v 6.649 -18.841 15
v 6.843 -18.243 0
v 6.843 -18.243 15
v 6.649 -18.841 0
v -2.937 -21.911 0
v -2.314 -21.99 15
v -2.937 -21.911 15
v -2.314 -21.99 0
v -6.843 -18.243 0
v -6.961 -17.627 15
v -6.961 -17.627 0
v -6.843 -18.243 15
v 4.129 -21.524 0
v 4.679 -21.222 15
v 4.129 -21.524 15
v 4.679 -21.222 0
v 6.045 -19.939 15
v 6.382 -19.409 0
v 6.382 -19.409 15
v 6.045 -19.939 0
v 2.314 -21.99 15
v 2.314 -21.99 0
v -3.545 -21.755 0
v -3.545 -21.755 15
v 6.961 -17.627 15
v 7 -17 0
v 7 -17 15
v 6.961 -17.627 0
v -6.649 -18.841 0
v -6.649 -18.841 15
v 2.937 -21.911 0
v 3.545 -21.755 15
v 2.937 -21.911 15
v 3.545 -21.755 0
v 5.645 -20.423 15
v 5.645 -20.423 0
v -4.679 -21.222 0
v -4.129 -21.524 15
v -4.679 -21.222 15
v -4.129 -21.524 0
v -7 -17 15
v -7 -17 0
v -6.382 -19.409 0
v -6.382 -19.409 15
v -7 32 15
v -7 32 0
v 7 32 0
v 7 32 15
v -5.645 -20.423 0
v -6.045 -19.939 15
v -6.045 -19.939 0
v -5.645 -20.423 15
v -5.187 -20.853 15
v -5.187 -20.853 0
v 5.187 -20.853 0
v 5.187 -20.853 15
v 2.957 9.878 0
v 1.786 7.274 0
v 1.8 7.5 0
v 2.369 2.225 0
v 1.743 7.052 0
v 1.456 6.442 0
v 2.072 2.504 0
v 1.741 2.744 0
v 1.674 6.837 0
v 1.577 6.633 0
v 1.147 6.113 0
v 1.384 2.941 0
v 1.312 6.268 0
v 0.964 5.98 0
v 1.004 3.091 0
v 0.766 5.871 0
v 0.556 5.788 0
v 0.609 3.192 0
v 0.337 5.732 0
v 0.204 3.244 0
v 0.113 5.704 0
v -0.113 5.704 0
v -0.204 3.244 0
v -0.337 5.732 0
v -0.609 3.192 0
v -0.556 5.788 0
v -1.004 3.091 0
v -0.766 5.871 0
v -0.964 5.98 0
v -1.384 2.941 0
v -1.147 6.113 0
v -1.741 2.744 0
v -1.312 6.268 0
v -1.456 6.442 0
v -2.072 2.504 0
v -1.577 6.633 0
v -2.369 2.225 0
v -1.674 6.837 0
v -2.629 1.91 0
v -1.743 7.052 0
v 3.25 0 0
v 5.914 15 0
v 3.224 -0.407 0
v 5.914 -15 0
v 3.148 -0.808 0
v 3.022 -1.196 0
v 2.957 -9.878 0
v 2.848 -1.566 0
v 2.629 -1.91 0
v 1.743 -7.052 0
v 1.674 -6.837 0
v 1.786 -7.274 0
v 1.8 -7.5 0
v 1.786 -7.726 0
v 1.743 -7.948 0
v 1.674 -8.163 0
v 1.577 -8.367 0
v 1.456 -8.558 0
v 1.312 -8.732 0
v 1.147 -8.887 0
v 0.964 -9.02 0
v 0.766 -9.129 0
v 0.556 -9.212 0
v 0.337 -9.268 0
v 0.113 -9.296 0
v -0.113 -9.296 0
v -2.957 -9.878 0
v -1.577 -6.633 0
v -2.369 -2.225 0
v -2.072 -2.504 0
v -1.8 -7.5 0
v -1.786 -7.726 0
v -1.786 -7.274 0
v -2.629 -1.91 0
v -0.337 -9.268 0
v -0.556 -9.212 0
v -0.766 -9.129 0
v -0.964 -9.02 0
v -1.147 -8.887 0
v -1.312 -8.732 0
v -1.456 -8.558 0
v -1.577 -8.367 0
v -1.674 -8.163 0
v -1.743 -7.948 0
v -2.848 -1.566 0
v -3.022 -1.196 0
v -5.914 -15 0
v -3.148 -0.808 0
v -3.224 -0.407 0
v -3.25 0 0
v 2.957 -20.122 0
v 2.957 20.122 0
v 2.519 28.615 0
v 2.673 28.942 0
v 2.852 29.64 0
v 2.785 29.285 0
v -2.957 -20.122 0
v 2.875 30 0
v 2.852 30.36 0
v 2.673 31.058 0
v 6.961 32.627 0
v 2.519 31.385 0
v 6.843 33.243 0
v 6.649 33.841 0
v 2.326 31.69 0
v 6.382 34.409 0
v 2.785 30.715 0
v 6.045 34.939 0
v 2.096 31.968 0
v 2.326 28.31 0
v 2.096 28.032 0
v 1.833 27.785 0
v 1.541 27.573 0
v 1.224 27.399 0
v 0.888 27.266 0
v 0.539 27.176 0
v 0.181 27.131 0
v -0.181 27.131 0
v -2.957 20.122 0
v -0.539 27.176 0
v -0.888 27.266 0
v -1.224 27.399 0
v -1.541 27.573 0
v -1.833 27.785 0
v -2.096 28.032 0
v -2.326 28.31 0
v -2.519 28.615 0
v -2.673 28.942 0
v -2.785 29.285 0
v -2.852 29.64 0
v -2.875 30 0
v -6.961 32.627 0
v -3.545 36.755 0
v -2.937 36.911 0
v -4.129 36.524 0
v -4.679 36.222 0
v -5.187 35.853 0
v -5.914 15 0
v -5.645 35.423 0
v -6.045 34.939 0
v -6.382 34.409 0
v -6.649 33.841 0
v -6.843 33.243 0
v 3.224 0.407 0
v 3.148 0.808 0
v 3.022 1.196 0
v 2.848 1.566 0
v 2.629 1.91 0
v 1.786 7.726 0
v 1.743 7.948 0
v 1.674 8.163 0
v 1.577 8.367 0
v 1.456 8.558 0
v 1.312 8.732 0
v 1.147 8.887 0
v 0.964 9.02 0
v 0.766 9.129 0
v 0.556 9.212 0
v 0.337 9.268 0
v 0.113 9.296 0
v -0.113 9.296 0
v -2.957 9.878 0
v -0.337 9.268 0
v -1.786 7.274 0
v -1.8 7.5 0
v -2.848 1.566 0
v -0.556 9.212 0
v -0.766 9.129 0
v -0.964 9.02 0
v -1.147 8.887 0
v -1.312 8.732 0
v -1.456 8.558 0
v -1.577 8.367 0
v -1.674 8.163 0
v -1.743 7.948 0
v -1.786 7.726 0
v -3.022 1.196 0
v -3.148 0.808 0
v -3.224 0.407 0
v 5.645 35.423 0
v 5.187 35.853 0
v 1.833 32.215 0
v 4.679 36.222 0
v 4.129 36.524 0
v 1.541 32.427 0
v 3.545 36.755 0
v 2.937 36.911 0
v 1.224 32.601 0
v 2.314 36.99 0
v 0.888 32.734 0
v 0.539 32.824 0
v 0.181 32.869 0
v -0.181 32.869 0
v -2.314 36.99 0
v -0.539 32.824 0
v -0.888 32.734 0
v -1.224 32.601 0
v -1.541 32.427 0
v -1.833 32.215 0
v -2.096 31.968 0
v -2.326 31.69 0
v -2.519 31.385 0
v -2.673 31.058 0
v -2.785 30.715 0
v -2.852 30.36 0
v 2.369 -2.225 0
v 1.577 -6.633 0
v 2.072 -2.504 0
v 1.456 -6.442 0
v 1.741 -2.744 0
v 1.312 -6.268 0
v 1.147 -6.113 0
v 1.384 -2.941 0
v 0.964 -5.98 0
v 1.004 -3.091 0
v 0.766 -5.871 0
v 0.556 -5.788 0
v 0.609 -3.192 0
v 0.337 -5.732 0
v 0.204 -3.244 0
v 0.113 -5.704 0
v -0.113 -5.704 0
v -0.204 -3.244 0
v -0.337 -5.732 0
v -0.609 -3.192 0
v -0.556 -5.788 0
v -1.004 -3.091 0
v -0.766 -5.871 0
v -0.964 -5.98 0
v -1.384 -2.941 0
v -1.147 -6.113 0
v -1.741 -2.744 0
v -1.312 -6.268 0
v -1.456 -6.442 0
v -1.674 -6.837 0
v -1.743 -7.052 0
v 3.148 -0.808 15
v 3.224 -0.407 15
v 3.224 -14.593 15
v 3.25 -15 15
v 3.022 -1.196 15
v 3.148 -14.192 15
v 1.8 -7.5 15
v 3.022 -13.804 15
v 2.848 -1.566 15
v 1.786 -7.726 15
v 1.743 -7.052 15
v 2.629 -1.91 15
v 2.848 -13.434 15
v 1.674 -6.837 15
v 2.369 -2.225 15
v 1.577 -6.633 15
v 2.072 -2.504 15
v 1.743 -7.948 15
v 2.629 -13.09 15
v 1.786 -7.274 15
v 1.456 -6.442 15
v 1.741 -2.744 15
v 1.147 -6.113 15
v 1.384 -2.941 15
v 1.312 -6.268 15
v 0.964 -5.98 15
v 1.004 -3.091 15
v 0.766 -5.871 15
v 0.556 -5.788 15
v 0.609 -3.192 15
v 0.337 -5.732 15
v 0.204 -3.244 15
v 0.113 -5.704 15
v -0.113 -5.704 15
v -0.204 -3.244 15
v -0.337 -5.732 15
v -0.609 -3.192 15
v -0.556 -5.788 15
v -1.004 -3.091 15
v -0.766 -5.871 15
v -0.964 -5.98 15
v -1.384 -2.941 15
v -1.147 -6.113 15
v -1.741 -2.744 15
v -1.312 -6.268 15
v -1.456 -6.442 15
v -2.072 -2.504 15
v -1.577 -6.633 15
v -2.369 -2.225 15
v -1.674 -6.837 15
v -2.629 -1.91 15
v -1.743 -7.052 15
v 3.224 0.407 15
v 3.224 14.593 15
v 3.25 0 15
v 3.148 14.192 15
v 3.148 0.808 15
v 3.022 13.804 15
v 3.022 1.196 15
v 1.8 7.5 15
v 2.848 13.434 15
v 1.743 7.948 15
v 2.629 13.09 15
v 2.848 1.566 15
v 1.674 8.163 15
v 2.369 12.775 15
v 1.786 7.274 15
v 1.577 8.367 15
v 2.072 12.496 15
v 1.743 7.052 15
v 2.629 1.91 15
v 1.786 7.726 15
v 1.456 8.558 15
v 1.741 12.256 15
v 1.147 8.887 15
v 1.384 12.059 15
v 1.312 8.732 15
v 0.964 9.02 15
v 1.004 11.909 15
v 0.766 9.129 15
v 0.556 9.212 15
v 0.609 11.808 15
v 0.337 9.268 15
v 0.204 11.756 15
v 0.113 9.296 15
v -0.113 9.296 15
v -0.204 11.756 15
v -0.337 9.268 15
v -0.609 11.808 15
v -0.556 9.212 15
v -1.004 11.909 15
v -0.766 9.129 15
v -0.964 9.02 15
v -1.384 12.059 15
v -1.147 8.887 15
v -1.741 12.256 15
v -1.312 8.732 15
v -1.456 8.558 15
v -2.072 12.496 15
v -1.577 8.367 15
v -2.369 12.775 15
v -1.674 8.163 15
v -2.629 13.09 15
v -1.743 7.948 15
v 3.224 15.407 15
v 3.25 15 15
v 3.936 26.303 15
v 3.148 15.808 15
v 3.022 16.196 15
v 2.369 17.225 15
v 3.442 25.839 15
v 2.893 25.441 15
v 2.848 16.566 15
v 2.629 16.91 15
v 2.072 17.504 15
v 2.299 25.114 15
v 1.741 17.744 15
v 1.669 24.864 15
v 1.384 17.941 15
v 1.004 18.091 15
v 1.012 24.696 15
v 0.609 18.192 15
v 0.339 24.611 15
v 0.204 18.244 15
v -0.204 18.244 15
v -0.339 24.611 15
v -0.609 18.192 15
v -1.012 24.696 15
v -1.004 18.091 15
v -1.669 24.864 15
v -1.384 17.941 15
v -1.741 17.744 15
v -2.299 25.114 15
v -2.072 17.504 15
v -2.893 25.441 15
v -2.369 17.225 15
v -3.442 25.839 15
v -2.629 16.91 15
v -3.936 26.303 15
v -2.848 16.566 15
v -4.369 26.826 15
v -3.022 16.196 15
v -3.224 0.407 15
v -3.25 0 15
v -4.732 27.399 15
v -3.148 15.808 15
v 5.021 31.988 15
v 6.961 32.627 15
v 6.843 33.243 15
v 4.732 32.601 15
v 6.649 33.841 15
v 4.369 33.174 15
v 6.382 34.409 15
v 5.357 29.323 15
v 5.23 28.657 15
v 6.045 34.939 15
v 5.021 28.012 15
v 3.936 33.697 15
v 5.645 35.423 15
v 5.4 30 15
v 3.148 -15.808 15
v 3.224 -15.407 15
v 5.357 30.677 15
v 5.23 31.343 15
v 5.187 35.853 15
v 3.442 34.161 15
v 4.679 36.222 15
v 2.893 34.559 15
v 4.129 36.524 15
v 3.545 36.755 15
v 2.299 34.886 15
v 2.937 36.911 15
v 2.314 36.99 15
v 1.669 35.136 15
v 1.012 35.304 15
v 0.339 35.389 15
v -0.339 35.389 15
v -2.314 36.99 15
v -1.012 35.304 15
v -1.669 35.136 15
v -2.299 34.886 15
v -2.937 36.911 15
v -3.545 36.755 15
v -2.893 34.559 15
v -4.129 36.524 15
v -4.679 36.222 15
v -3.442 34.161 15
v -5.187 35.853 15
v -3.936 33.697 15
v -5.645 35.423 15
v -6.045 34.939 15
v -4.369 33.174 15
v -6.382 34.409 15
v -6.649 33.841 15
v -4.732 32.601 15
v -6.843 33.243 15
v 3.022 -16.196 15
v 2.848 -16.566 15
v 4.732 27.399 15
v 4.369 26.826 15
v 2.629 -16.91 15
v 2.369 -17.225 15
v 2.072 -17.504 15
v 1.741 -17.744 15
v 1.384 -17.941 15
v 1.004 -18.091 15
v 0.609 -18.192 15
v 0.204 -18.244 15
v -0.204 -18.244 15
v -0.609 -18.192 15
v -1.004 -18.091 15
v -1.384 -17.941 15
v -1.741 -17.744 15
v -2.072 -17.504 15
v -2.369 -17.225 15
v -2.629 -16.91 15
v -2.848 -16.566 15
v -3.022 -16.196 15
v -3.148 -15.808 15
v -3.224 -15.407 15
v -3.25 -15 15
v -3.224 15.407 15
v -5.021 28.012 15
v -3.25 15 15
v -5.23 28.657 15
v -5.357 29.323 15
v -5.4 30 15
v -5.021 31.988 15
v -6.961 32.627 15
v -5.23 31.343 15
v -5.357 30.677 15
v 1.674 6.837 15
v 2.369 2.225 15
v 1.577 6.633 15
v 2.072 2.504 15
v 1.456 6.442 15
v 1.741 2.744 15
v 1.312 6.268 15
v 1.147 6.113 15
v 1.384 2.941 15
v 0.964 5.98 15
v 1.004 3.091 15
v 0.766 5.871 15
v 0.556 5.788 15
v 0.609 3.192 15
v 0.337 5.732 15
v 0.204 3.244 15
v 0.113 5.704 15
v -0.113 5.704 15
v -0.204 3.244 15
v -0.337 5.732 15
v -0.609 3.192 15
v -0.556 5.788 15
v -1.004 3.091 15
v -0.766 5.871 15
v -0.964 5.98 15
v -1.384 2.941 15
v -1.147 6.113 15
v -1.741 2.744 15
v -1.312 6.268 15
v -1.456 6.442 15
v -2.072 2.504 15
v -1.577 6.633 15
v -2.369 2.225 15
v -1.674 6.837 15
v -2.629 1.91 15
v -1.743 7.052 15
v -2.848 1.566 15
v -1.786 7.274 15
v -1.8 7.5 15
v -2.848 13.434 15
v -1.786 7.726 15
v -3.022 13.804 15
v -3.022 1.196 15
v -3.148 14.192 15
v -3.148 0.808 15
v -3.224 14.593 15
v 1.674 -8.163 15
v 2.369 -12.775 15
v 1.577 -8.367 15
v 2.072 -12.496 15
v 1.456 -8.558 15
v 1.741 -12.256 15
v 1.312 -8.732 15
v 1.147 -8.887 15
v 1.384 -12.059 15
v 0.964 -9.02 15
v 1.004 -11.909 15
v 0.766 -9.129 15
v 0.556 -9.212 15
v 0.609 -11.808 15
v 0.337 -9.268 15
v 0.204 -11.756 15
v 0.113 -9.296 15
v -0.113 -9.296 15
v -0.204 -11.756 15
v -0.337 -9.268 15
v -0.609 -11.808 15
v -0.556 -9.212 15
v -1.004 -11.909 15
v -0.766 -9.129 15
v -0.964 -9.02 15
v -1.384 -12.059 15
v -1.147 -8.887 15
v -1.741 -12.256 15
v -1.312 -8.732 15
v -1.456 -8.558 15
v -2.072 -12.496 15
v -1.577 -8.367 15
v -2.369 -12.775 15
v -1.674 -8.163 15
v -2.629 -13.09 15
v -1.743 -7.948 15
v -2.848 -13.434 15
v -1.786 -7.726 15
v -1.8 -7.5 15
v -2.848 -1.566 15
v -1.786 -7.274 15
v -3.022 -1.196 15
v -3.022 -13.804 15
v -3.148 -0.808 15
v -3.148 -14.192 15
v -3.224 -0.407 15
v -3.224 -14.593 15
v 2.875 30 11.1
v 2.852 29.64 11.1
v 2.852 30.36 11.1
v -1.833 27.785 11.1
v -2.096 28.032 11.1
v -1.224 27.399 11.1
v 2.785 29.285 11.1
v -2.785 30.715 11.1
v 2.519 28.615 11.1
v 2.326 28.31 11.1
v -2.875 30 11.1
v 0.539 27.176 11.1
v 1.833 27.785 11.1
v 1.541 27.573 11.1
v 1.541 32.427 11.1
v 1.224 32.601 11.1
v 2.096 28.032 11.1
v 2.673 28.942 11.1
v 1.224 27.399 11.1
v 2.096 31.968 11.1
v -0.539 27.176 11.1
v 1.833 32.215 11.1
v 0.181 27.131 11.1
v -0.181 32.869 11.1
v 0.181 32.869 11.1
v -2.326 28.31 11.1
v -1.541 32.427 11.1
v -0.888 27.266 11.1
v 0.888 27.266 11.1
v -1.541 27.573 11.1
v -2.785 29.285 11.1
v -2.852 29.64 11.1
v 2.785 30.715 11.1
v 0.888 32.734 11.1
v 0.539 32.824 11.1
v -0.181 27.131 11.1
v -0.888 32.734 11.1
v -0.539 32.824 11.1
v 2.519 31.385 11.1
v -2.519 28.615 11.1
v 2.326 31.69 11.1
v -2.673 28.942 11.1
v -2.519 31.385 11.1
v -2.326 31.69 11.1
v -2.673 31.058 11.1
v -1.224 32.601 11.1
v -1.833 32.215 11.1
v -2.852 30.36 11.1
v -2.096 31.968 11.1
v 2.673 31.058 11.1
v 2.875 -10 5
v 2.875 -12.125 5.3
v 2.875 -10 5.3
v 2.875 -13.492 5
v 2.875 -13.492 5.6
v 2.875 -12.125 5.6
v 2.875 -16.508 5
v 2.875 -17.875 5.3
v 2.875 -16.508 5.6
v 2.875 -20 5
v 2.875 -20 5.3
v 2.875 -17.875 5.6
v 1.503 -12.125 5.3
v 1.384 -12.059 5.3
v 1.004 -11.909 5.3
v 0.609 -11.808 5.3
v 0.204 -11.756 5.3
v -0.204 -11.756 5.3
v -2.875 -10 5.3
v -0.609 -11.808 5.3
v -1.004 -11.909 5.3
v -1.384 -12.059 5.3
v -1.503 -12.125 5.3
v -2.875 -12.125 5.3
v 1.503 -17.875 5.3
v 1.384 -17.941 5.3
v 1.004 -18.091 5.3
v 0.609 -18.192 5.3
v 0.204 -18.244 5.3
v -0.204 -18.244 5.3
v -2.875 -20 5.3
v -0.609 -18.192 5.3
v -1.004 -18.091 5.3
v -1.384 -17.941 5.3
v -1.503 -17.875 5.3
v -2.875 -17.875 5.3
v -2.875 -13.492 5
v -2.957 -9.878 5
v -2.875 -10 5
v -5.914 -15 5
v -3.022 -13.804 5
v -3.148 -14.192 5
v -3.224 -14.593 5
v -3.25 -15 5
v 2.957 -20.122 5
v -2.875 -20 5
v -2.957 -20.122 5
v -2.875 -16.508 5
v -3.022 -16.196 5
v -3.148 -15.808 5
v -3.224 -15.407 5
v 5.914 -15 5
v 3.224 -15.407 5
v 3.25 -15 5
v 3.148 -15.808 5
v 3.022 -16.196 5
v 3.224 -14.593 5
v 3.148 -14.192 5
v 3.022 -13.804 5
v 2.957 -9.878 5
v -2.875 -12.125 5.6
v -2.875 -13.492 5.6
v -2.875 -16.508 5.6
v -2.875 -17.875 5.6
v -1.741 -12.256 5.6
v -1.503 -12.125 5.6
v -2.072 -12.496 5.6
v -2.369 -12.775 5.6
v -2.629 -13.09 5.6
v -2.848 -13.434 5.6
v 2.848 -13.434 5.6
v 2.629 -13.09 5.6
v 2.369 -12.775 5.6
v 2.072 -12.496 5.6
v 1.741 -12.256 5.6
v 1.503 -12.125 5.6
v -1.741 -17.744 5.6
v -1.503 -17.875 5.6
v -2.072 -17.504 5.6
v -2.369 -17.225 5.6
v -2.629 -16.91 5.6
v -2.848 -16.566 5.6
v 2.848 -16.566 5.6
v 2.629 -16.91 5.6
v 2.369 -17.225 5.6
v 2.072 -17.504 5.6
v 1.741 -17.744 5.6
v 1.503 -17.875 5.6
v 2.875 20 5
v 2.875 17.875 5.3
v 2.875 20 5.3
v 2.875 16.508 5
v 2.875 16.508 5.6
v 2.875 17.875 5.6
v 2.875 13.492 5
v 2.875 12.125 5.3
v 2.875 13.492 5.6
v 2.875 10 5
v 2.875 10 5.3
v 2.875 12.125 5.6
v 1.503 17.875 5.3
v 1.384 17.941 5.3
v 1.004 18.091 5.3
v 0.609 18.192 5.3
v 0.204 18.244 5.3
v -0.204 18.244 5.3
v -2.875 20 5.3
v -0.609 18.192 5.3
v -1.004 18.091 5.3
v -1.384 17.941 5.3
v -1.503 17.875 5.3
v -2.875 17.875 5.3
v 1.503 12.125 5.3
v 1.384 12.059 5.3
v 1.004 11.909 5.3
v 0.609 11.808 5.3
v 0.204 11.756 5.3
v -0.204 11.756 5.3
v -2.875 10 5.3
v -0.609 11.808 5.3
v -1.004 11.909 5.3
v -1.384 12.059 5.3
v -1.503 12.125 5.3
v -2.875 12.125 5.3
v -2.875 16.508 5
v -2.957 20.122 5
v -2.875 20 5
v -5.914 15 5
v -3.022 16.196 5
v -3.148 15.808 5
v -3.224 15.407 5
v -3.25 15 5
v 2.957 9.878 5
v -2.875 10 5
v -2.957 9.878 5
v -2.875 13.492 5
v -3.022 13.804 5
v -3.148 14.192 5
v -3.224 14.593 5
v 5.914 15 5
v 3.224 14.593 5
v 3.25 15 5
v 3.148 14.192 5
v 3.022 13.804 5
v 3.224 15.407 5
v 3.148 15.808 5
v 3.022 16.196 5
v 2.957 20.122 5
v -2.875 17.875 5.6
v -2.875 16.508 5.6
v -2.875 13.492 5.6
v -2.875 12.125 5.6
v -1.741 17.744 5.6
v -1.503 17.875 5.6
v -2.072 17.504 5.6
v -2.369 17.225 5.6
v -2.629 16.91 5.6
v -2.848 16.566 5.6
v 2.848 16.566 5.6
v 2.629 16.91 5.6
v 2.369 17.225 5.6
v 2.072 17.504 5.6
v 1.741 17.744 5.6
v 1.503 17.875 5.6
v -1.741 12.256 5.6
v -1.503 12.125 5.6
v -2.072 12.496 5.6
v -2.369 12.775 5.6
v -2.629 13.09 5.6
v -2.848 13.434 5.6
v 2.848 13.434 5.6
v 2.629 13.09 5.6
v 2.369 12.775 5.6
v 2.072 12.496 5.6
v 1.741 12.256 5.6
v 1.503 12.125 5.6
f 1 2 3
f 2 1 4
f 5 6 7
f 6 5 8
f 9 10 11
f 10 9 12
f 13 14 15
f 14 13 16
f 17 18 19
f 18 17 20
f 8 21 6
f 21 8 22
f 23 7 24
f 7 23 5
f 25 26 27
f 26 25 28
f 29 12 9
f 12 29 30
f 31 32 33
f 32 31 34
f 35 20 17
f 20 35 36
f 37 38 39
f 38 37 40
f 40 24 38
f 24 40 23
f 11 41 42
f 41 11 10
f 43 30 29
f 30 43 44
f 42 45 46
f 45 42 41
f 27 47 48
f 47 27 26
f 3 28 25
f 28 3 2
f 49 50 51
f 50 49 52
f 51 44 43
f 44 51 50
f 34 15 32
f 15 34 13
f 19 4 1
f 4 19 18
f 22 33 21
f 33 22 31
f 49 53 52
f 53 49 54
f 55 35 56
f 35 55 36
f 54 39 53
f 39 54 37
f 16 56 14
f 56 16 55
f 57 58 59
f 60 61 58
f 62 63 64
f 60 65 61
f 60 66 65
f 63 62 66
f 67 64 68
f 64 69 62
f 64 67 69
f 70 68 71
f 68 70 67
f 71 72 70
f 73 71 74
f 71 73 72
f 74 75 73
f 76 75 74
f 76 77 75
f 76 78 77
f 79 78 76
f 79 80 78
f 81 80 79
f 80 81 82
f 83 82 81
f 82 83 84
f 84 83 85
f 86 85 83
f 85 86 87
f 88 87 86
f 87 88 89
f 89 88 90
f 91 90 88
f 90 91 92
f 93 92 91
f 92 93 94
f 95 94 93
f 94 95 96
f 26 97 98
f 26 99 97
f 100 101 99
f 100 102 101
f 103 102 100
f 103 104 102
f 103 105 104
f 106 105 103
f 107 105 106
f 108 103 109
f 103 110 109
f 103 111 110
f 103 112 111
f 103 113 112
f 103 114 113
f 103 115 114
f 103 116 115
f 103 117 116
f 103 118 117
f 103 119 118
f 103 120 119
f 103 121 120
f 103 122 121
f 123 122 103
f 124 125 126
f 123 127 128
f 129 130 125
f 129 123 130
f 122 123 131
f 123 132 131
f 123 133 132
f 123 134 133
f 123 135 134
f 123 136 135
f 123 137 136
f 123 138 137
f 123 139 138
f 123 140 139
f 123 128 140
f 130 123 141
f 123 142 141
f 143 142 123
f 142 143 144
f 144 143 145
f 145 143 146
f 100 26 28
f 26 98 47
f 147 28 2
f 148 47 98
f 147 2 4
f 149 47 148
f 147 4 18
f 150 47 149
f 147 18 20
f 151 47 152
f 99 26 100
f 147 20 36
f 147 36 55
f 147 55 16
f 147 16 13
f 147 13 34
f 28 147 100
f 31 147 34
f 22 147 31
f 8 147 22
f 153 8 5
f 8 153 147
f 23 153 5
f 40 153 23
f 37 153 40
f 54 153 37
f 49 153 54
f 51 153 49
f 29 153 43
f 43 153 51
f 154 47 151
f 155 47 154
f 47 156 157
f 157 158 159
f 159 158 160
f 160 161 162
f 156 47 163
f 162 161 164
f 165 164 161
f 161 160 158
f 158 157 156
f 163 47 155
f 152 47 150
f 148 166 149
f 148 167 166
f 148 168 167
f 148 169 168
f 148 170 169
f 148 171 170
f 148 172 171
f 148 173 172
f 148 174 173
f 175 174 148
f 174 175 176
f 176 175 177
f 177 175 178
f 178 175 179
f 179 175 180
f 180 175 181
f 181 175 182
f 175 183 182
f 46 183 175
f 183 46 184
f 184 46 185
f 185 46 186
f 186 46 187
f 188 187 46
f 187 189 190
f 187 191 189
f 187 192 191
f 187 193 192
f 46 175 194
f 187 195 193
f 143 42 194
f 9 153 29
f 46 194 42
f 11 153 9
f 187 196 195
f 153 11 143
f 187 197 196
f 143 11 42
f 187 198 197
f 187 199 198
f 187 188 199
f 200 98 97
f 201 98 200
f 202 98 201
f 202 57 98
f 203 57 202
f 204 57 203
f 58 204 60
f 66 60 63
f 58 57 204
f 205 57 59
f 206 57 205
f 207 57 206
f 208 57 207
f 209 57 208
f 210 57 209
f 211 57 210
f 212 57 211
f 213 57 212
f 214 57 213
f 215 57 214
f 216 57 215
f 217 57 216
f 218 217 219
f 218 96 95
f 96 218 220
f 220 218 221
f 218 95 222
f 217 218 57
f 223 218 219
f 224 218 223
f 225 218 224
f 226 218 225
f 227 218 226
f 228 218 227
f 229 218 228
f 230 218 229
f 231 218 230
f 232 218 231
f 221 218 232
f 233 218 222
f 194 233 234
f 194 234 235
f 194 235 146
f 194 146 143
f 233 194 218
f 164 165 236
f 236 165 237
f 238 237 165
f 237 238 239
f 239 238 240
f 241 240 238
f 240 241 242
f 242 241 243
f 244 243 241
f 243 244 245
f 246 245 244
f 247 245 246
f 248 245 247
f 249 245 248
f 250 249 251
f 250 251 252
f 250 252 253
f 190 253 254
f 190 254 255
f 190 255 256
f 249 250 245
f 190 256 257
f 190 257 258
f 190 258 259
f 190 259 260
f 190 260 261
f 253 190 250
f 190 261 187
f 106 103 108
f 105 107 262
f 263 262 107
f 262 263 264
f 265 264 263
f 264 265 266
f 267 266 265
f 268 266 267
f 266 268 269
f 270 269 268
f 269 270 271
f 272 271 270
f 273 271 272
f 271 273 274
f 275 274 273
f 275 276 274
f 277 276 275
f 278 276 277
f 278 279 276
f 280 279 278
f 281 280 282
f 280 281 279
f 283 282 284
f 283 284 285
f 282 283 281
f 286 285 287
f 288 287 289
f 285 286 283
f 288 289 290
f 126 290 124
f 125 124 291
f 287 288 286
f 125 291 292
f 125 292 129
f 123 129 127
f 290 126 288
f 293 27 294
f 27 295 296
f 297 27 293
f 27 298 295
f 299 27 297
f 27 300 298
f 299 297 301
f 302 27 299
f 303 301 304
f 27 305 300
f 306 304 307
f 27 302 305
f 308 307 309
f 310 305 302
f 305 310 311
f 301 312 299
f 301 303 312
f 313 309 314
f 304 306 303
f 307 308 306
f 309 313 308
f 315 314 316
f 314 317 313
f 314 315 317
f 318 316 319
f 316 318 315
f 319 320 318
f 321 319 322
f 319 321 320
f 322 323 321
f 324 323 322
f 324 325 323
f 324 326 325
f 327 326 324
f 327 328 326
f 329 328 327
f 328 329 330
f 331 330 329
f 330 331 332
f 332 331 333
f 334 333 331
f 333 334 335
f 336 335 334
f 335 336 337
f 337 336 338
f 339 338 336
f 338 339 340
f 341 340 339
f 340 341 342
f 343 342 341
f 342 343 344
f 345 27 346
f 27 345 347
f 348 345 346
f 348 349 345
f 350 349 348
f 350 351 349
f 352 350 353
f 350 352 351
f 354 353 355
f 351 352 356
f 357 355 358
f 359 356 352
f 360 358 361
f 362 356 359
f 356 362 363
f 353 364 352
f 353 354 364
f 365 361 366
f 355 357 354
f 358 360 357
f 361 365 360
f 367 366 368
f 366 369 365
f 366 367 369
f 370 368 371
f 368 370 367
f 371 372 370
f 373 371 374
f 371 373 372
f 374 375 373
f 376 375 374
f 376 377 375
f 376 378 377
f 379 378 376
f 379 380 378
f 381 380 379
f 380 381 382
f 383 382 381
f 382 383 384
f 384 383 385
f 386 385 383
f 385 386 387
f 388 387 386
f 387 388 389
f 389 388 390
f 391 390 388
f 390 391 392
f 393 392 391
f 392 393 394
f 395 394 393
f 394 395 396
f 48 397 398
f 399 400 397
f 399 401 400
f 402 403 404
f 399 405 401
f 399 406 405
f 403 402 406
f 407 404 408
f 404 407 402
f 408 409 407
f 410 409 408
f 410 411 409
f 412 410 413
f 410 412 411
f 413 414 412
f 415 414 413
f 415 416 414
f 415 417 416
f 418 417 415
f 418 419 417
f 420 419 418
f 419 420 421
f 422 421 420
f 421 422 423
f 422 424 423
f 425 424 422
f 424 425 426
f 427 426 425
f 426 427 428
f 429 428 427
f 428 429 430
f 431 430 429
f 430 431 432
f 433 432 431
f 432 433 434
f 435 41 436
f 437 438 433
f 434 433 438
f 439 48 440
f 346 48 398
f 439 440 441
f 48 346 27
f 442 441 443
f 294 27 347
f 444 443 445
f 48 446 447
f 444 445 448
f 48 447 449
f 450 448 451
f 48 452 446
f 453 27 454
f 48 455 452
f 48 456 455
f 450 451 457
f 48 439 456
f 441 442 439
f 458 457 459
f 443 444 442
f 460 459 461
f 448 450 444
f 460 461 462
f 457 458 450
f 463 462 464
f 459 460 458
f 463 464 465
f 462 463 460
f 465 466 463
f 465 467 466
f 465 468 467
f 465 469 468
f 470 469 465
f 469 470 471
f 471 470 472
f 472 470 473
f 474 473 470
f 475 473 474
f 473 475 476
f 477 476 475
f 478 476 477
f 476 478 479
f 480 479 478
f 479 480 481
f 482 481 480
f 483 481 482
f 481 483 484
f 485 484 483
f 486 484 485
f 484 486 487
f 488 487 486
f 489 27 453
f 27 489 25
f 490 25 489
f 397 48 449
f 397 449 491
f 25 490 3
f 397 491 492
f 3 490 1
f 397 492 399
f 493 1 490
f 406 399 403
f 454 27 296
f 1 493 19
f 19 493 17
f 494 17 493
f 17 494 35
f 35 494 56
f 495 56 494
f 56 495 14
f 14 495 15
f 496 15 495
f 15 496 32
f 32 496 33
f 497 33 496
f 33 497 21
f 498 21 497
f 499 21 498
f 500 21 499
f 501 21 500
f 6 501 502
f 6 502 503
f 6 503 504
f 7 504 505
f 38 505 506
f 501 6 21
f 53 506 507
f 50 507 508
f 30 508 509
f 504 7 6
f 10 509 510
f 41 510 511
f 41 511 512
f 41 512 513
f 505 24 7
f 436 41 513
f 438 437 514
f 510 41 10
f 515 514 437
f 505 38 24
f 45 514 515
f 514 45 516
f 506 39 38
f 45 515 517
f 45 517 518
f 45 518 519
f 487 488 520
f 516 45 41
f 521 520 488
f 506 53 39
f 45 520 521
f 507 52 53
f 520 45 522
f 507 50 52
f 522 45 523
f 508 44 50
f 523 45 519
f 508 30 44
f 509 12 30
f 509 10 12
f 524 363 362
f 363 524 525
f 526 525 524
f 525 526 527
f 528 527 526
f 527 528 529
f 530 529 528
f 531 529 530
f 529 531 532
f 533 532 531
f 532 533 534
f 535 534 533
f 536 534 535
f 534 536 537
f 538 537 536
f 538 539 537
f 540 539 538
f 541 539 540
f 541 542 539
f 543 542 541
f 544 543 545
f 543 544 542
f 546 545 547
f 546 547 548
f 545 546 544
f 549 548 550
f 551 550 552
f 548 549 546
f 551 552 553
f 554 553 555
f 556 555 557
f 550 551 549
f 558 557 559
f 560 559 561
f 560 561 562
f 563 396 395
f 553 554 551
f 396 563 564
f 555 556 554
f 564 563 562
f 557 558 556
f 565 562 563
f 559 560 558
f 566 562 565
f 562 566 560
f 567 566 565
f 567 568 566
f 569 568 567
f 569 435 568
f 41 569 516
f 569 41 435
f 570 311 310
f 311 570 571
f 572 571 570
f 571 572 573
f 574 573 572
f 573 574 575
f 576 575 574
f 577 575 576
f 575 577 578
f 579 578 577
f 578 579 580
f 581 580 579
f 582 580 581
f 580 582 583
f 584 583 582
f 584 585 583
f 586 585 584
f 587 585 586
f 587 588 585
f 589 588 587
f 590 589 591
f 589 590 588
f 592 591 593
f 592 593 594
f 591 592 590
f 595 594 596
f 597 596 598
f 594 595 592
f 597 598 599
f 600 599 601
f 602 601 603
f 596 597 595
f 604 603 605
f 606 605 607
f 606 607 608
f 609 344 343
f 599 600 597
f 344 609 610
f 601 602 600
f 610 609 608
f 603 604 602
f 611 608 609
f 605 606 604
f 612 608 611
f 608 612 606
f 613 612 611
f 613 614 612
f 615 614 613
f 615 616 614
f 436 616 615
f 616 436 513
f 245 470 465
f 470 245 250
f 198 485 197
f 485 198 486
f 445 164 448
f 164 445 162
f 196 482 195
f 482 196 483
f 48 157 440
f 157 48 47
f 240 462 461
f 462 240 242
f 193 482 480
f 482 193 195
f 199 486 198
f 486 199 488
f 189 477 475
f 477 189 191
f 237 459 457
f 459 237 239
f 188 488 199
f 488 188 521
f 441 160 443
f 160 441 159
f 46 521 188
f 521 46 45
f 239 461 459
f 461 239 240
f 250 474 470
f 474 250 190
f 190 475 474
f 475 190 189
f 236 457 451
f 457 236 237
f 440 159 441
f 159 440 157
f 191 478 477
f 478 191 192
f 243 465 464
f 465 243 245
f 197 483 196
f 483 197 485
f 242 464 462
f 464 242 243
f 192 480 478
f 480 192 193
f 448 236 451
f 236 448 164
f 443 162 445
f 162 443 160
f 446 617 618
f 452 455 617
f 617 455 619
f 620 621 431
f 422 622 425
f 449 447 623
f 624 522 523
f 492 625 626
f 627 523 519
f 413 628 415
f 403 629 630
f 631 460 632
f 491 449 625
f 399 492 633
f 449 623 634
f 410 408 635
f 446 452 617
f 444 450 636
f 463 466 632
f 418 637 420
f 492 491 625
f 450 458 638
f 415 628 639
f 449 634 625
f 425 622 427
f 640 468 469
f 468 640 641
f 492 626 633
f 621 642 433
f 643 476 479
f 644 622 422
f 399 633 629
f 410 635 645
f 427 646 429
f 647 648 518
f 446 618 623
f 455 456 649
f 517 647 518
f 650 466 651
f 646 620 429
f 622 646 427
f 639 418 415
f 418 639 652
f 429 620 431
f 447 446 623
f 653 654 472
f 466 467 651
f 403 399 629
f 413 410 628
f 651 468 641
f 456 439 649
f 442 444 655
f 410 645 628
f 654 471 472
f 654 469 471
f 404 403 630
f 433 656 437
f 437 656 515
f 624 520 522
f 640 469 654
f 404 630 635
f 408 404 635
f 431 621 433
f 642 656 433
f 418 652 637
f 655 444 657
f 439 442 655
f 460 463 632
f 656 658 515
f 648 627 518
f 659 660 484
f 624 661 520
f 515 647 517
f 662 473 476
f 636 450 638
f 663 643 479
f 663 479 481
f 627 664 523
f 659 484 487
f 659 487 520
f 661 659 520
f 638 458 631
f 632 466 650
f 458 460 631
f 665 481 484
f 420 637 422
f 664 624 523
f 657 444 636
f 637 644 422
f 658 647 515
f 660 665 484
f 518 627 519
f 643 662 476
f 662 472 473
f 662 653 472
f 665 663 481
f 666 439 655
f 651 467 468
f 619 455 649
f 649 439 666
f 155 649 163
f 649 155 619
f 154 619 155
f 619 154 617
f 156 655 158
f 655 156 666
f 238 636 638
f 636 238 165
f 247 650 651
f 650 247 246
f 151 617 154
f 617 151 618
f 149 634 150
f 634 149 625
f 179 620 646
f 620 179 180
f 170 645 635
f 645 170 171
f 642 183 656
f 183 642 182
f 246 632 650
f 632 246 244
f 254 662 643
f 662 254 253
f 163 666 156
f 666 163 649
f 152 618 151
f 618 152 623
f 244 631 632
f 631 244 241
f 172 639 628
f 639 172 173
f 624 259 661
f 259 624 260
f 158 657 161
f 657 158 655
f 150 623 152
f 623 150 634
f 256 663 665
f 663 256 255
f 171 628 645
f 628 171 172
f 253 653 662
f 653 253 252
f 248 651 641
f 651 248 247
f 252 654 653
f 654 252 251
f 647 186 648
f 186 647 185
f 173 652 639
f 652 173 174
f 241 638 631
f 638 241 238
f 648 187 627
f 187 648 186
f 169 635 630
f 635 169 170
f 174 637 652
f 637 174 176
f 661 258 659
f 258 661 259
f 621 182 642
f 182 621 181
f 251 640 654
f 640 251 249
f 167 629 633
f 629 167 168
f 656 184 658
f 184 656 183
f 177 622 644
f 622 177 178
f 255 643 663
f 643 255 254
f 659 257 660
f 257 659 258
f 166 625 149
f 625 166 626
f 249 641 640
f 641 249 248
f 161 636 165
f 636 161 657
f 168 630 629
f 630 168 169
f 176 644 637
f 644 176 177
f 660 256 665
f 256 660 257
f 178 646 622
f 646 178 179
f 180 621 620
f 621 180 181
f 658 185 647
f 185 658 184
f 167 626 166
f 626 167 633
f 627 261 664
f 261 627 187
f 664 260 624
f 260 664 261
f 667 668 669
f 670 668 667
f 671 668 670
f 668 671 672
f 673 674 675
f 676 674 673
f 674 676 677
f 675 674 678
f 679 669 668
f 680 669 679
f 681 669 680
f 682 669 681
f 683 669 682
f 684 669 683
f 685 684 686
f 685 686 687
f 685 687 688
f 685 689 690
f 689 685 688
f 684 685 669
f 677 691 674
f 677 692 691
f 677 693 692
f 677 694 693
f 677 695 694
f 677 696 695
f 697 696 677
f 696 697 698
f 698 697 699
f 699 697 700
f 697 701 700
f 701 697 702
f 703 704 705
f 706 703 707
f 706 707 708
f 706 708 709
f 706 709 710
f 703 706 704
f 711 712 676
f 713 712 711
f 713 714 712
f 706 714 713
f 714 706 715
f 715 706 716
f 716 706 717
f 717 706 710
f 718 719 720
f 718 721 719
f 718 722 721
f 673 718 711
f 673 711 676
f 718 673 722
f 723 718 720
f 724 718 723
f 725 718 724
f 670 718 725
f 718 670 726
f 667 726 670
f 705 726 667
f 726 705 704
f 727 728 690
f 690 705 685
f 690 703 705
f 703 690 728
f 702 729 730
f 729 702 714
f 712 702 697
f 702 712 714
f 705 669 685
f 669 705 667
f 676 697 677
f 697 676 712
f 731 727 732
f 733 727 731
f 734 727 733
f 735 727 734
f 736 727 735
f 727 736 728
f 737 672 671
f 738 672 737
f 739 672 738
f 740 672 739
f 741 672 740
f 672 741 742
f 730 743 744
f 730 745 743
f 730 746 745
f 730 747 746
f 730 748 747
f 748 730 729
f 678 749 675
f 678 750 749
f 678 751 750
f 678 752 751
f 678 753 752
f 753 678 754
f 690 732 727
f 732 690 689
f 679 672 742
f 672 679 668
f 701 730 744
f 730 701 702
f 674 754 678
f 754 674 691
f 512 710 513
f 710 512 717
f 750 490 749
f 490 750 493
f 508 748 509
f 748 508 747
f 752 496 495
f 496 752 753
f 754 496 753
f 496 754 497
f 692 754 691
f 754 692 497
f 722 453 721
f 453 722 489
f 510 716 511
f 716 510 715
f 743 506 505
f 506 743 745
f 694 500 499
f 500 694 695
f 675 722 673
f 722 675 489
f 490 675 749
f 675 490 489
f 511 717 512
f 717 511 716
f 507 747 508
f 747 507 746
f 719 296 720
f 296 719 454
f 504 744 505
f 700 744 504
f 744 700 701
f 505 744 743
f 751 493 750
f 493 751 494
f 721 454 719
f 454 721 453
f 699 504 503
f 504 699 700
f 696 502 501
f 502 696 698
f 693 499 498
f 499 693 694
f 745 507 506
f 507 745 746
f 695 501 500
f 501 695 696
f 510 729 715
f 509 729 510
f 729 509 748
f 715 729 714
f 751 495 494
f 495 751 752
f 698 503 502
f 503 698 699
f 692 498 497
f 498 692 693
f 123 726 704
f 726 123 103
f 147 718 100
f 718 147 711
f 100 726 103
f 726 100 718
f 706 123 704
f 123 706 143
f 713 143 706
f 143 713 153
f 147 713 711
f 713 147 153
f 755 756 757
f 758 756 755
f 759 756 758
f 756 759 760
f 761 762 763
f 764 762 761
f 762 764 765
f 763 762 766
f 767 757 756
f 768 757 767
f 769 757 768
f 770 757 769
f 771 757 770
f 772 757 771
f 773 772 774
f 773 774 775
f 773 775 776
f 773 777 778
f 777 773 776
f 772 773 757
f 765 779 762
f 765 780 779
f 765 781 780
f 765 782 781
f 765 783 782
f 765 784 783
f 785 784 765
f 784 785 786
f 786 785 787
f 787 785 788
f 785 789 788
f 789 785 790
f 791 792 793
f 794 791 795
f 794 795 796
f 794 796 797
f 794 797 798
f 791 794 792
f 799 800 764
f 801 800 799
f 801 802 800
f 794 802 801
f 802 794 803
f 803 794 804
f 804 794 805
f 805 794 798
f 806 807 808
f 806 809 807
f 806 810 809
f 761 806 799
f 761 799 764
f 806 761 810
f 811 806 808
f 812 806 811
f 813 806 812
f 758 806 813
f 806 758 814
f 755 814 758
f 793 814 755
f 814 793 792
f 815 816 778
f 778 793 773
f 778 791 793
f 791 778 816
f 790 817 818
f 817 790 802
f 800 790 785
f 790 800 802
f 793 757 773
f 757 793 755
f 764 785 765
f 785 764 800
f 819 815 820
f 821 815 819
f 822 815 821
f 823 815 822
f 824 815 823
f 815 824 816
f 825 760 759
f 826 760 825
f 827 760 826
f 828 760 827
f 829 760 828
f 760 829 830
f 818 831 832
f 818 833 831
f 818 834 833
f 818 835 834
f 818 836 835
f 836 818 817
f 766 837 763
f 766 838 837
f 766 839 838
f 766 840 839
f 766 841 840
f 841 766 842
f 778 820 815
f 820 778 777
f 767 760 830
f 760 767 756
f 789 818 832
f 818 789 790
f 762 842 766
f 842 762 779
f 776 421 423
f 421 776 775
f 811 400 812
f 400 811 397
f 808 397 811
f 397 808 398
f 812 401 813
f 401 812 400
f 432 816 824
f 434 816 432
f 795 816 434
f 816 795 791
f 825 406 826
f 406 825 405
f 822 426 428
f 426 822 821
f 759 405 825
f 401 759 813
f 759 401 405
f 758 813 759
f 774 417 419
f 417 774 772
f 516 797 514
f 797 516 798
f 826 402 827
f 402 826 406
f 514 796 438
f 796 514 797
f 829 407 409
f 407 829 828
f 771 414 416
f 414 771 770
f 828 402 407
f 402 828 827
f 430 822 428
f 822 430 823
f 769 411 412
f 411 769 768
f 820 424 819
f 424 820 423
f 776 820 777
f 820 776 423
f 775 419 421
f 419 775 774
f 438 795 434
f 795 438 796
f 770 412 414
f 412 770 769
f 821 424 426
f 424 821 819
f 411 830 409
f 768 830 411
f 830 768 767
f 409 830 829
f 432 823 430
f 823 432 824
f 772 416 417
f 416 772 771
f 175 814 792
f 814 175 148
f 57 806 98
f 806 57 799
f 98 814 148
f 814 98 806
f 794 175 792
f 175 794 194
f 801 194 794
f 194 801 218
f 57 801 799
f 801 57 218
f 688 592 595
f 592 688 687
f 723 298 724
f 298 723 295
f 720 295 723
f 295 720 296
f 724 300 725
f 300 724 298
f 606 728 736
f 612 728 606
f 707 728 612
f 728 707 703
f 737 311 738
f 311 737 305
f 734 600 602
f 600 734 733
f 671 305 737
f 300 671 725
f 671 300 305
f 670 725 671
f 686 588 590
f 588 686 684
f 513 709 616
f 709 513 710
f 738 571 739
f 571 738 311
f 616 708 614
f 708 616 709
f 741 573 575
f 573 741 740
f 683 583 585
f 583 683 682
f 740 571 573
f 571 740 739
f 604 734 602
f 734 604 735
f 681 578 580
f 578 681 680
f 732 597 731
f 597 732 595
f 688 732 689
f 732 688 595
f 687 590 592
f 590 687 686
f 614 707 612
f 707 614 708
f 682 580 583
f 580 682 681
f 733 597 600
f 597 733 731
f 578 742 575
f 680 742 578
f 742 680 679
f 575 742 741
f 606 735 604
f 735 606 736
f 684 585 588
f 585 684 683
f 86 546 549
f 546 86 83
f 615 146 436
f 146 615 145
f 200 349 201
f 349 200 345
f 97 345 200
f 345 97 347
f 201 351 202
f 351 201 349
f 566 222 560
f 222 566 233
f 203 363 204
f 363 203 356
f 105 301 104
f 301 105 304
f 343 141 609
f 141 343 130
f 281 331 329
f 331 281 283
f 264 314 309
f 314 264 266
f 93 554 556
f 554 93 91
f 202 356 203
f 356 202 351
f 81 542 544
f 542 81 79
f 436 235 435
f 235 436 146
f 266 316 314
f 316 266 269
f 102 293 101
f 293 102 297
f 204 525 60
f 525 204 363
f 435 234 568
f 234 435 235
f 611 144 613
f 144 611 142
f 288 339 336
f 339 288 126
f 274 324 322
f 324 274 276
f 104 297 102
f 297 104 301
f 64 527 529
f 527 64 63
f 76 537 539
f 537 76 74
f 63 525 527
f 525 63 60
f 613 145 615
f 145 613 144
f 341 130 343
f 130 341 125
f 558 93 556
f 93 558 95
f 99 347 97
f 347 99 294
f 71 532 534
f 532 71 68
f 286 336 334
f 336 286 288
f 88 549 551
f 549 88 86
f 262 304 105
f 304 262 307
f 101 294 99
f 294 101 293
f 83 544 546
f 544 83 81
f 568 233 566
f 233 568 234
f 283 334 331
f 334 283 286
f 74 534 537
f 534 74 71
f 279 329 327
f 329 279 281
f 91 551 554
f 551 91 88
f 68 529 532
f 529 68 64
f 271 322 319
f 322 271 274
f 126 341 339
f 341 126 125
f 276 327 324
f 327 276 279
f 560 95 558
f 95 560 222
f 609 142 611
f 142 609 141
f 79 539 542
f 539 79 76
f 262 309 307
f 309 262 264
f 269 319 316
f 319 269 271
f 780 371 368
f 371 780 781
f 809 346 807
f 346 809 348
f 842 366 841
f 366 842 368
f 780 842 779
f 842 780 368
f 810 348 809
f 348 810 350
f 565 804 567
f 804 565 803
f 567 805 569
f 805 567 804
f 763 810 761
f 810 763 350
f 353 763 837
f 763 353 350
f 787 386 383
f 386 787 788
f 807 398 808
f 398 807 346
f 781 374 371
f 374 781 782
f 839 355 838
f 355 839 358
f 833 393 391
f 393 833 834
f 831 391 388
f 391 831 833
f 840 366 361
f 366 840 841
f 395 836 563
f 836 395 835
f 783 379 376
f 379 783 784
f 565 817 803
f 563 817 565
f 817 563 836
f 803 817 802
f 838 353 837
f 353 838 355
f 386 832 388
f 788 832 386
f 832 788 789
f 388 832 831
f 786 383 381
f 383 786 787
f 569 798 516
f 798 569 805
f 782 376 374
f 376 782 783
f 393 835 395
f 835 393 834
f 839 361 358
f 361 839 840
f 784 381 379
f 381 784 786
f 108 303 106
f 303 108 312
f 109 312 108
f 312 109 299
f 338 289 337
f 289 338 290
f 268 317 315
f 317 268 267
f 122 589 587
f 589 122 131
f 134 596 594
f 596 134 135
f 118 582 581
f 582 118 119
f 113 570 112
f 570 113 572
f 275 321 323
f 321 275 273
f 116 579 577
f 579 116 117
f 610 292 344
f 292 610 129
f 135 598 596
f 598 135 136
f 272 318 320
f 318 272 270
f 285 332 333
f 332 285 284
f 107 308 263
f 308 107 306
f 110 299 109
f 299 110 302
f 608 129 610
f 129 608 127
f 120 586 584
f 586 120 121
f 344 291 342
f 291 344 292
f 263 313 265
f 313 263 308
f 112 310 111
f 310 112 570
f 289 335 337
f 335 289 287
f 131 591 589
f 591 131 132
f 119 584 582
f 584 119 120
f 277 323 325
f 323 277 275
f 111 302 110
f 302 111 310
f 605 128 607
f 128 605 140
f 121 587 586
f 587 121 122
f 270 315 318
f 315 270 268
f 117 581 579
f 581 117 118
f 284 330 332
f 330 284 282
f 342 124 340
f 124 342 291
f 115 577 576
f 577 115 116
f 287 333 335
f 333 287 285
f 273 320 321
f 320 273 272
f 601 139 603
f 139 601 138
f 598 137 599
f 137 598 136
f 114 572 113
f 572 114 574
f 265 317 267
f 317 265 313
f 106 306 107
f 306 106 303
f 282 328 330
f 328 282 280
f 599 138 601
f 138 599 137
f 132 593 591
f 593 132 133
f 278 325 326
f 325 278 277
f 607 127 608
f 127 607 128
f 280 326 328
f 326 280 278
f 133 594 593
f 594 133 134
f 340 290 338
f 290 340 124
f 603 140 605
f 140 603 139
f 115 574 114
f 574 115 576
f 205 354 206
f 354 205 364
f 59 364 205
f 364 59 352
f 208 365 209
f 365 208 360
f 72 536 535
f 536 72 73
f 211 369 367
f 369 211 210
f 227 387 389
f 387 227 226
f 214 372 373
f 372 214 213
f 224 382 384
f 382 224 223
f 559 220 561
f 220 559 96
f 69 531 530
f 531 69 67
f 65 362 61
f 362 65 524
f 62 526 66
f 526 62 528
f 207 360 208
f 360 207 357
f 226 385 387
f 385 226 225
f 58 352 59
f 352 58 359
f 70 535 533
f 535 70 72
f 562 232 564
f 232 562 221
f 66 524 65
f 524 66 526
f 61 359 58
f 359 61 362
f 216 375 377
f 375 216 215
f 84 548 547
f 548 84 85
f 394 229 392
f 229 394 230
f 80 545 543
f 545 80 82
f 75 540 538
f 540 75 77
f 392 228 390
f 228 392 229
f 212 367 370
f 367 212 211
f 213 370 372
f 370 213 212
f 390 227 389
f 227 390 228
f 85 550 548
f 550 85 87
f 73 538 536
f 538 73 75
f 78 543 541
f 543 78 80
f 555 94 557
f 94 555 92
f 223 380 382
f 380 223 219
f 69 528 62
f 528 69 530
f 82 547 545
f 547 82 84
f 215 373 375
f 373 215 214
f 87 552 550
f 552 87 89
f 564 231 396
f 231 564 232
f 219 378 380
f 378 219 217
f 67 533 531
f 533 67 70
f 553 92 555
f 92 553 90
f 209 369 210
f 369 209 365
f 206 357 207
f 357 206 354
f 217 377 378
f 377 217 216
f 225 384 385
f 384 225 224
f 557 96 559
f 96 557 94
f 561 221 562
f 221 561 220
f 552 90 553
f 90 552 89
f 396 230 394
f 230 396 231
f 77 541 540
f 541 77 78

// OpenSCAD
$fn = 50;


difference() {
	union() {
		hull() {
			translate(v = [-2.0000000000, 17.0000000000, 0]) {
				cylinder(h = 15, r = 5);
			}
			translate(v = [2.0000000000, 17.0000000000, 0]) {
				cylinder(h = 15, r = 5);
			}
			translate(v = [-2.0000000000, -17.0000000000, 0]) {
				cylinder(h = 15, r = 5);
			}
			translate(v = [2.0000000000, -17.0000000000, 0]) {
				cylinder(h = 15, r = 5);
			}
		}
		translate(v = [0.0000000000, 22.5000000000, 0]) {
			hull() {
				translate(v = [-2.0000000000, 9.5000000000, 0]) {
					cylinder(h = 15, r = 5);
				}
				translate(v = [2.0000000000, 9.5000000000, 0]) {
					cylinder(h = 15, r = 5);
				}
				translate(v = [-2.0000000000, -9.5000000000, 0]) {
					cylinder(h = 15, r = 5);
				}
				translate(v = [2.0000000000, -9.5000000000, 0]) {
					cylinder(h = 15, r = 5);
				}
			}
		}
		translate(v = [0.0000000000, 22.5000000000, 0]) {
			hull() {
				translate(v = [-2.0000000000, 9.5000000000, 0]) {
					cylinder(h = 15, r = 5);
				}
				translate(v = [2.0000000000, 9.5000000000, 0]) {
					cylinder(h = 15, r = 5);
				}
				translate(v = [-2.0000000000, -9.5000000000, 0]) {
					cylinder(h = 15, r = 5);
				}
				translate(v = [2.0000000000, -9.5000000000, 0]) {
					cylinder(h = 15, r = 5);
				}
			}
		}
	}
	union() {
		translate(v = [0.0000000000, 30.0000000000, 15]) {
			rotate(a = [0, 0, 0]) {
				difference() {
					union() {
						#translate(v = [0, 0, -15.0000000000]) {
							cylinder(h = 15, r = 2.6000000000);
						}
						#translate(v = [0, 0, -3.9000000000]) {
							cylinder(h = 3.9000000000, r1 = 2.8750000000, r2 = 5.4000000000);
						}
						#translate(v = [0, 0, -15.0000000000]) {
							cylinder(h = 15, r = 2.8750000000);
						}
						#translate(v = [0, 0, -15.0000000000]) {
							cylinder(h = 15, r = 2.6000000000);
						}
					}
					union();
				}
			}
		}
		translate(v = [0.0000000000, 30.0000000000, 15]) {
			rotate(a = [0, 0, 0]) {
				difference() {
					union() {
						#translate(v = [0, 0, -15.0000000000]) {
							cylinder(h = 15, r = 2.6000000000);
						}
						#translate(v = [0, 0, -3.9000000000]) {
							cylinder(h = 3.9000000000, r1 = 2.8750000000, r2 = 5.4000000000);
						}
						#translate(v = [0, 0, -15.0000000000]) {
							cylinder(h = 15, r = 2.8750000000);
						}
						#translate(v = [0, 0, -15.0000000000]) {
							cylinder(h = 15, r = 2.6000000000);
						}
					}
					union();
				}
			}
		}
		translate(v = [0.0000000000, -15.0000000000, 0]) {
			rotate(a = [0, 0, 0]) {
				difference() {
					union() {
						#translate(v = [-2.8750000000, -5.0000000000, -0.3000000000]) {
							cube(size = [5.7500000000, 10, 0.3000000000]);
						}
						#translate(v = [-2.8750000000, -2.8750000000, -0.6000000000]) {
							cube(size = [5.7500000000, 5.7500000000, 0.3000000000]);
						}
						#translate(v = [-2.8750000000, -5.0000000000, 5]) {
							cube(size = [5.7500000000, 10, 0.3000000000]);
						}
						#translate(v = [-2.8750000000, -2.8750000000, 5.3000000000]) {
							cube(size = [5.7500000000, 5.7500000000, 0.3000000000]);
						}
						#translate(v = [0, 0, -100.0000000000]) {
							cylinder(h = 200, r = 3.2500000000);
						}
						#linear_extrude(height = 5) {
							polygon(points = [[5.9142500000, 0.0000000000], [2.9571250000, 5.1218907443], [-2.9571250000, 5.1218907443], [-5.9142500000, 0.0000000000], [-2.9571250000, -5.1218907443], [2.9571250000, -5.1218907443]]);
						}
						#translate(v = [-2.8750000000, -5.0000000000, -0.3000000000]) {
							cube(size = [5.7500000000, 10, 0.3000000000]);
						}
						#translate(v = [-2.8750000000, -2.8750000000, -0.6000000000]) {
							cube(size = [5.7500000000, 5.7500000000, 0.3000000000]);
						}
						#translate(v = [-2.8750000000, -5.0000000000, 5]) {
							cube(size = [5.7500000000, 10, 0.3000000000]);
						}
						#translate(v = [-2.8750000000, -2.8750000000, 5.3000000000]) {
							cube(size = [5.7500000000, 5.7500000000, 0.3000000000]);
						}
						#translate(v = [0, 0, -100.0000000000]) {
							cylinder(h = 200, r = 3.2500000000);
						}
						#translate(v = [-2.8750000000, -5.0000000000, -0.3000000000]) {
							cube(size = [5.7500000000, 10, 0.3000000000]);
						}
						#translate(v = [-2.8750000000, -2.8750000000, -0.6000000000]) {
							cube(size = [5.7500000000, 5.7500000000, 0.3000000000]);
						}
						#translate(v = [-2.8750000000, -5.0000000000, 5]) {
							cube(size = [5.7500000000, 10, 0.3000000000]);
						}
						#translate(v = [-2.8750000000, -2.8750000000, 5.3000000000]) {
							cube(size = [5.7500000000, 5.7500000000, 0.3000000000]);
						}
						#translate(v = [0, 0, -100.0000000000]) {
							cylinder(h = 200, r = 3.2500000000);
						}
					}
					union();
				}
			}
		}
		translate(v = [0.0000000000, 15.0000000000, 0]) {
			rotate(a = [0, 0, 0]) {
				difference() {
					union() {
						#translate(v = [-2.8750000000, -5.0000000000, -0.3000000000]) {
							cube(size = [5.7500000000, 10, 0.3000000000]);
						}
						#translate(v = [-2.8750000000, -2.8750000000, -0.6000000000]) {
							cube(size = [5.7500000000, 5.7500000000, 0.3000000000]);
						}
						#translate(v = [-2.8750000000, -5.0000000000, 5]) {
							cube(size = [5.7500000000, 10, 0.3000000000]);
						}
						#translate(v = [-2.8750000000, -2.8750000000, 5.3000000000]) {
							cube(size = [5.7500000000, 5.7500000000, 0.3000000000]);
						}
						#translate(v = [0, 0, -100.0000000000]) {
							cylinder(h = 200, r = 3.2500000000);
						}
						#linear_extrude(height = 5) {
							polygon(points = [[5.9142500000, 0.0000000000], [2.9571250000, 5.1218907443], [-2.9571250000, 5.1218907443], [-5.9142500000, 0.0000000000], [-2.9571250000, -5.1218907443], [2.9571250000, -5.1218907443]]);
						}
						#translate(v = [-2.8750000000, -5.0000000000, -0.3000000000]) {
							cube(size = [5.7500000000, 10, 0.3000000000]);
						}
						#translate(v = [-2.8750000000, -2.8750000000, -0.6000000000]) {
							cube(size = [5.7500000000, 5.7500000000, 0.3000000000]);
						}
						#translate(v = [-2.8750000000, -5.0000000000, 5]) {
							cube(size = [5.7500000000, 10, 0.3000000000]);
						}
						#translate(v = [-2.8750000000, -2.8750000000, 5.3000000000]) {
							cube(size = [5.7500000000, 5.7500000000, 0.3000000000]);
						}
						#translate(v = [0, 0, -100.0000000000]) {
							cylinder(h = 200, r = 3.2500000000);
						}
						#translate(v = [-2.8750000000, -5.0000000000, -0.3000000000]) {
							cube(size = [5.7500000000, 10, 0.3000000000]);
						}
						#translate(v = [-2.8750000000, -2.8750000000, -0.6000000000]) {
							cube(size = [5.7500000000, 5.7500000000, 0.3000000000]);
						}
						#translate(v = [-2.8750000000, -5.0000000000, 5]) {
							cube(size = [5.7500000000, 10, 0.3000000000]);
						}
						#translate(v = [-2.8750000000, -2.8750000000, 5.3000000000]) {
							cube(size = [5.7500000000, 5.7500000000, 0.3000000000]);
						}
						#translate(v = [0, 0, -100.0000000000]) {
							cylinder(h = 200, r = 3.2500000000);
						}
					}
					union();
				}
			}
		}
		translate(v = [0.0000000000, -15.0000000000, 0]) {
			translate(v = [0, 0, -100]) {
				cylinder(h = 200, r = 3.2500000000);
			}
		}
		translate(v = [0, 0, -100]) {
			cylinder(h = 200, r = 3.2500000000);
		}
		translate(v = [0.0000000000, 15.0000000000, 0]) {
			translate(v = [0, 0, -100]) {
				cylinder(h = 200, r = 3.2500000000);
			}
		}
		translate(v = [0.0000000000, -15.0000000000, 0]) {
			translate(v = [0, 0, -100]) {
				cylinder(h = 200, r = 1.8000000000);
			}
		}
		translate(v = [0.0000000000, -7.5000000000, 0]) {
			translate(v = [0, 0, -100]) {
				cylinder(h = 200, r = 1.8000000000);
			}
		}
		translate(v = [0, 0, -100]) {
			cylinder(h = 200, r = 1.8000000000);
		}
		translate(v = [0.0000000000, 7.5000000000, 0]) {
			translate(v = [0, 0, -100]) {
				cylinder(h = 200, r = 1.8000000000);
			}
		}
		translate(v = [0.0000000000, 15.0000000000, 0]) {
			translate(v = [0, 0, -100]) {
				cylinder(h = 200, r = 1.8000000000);
			}
		}
	}
}
